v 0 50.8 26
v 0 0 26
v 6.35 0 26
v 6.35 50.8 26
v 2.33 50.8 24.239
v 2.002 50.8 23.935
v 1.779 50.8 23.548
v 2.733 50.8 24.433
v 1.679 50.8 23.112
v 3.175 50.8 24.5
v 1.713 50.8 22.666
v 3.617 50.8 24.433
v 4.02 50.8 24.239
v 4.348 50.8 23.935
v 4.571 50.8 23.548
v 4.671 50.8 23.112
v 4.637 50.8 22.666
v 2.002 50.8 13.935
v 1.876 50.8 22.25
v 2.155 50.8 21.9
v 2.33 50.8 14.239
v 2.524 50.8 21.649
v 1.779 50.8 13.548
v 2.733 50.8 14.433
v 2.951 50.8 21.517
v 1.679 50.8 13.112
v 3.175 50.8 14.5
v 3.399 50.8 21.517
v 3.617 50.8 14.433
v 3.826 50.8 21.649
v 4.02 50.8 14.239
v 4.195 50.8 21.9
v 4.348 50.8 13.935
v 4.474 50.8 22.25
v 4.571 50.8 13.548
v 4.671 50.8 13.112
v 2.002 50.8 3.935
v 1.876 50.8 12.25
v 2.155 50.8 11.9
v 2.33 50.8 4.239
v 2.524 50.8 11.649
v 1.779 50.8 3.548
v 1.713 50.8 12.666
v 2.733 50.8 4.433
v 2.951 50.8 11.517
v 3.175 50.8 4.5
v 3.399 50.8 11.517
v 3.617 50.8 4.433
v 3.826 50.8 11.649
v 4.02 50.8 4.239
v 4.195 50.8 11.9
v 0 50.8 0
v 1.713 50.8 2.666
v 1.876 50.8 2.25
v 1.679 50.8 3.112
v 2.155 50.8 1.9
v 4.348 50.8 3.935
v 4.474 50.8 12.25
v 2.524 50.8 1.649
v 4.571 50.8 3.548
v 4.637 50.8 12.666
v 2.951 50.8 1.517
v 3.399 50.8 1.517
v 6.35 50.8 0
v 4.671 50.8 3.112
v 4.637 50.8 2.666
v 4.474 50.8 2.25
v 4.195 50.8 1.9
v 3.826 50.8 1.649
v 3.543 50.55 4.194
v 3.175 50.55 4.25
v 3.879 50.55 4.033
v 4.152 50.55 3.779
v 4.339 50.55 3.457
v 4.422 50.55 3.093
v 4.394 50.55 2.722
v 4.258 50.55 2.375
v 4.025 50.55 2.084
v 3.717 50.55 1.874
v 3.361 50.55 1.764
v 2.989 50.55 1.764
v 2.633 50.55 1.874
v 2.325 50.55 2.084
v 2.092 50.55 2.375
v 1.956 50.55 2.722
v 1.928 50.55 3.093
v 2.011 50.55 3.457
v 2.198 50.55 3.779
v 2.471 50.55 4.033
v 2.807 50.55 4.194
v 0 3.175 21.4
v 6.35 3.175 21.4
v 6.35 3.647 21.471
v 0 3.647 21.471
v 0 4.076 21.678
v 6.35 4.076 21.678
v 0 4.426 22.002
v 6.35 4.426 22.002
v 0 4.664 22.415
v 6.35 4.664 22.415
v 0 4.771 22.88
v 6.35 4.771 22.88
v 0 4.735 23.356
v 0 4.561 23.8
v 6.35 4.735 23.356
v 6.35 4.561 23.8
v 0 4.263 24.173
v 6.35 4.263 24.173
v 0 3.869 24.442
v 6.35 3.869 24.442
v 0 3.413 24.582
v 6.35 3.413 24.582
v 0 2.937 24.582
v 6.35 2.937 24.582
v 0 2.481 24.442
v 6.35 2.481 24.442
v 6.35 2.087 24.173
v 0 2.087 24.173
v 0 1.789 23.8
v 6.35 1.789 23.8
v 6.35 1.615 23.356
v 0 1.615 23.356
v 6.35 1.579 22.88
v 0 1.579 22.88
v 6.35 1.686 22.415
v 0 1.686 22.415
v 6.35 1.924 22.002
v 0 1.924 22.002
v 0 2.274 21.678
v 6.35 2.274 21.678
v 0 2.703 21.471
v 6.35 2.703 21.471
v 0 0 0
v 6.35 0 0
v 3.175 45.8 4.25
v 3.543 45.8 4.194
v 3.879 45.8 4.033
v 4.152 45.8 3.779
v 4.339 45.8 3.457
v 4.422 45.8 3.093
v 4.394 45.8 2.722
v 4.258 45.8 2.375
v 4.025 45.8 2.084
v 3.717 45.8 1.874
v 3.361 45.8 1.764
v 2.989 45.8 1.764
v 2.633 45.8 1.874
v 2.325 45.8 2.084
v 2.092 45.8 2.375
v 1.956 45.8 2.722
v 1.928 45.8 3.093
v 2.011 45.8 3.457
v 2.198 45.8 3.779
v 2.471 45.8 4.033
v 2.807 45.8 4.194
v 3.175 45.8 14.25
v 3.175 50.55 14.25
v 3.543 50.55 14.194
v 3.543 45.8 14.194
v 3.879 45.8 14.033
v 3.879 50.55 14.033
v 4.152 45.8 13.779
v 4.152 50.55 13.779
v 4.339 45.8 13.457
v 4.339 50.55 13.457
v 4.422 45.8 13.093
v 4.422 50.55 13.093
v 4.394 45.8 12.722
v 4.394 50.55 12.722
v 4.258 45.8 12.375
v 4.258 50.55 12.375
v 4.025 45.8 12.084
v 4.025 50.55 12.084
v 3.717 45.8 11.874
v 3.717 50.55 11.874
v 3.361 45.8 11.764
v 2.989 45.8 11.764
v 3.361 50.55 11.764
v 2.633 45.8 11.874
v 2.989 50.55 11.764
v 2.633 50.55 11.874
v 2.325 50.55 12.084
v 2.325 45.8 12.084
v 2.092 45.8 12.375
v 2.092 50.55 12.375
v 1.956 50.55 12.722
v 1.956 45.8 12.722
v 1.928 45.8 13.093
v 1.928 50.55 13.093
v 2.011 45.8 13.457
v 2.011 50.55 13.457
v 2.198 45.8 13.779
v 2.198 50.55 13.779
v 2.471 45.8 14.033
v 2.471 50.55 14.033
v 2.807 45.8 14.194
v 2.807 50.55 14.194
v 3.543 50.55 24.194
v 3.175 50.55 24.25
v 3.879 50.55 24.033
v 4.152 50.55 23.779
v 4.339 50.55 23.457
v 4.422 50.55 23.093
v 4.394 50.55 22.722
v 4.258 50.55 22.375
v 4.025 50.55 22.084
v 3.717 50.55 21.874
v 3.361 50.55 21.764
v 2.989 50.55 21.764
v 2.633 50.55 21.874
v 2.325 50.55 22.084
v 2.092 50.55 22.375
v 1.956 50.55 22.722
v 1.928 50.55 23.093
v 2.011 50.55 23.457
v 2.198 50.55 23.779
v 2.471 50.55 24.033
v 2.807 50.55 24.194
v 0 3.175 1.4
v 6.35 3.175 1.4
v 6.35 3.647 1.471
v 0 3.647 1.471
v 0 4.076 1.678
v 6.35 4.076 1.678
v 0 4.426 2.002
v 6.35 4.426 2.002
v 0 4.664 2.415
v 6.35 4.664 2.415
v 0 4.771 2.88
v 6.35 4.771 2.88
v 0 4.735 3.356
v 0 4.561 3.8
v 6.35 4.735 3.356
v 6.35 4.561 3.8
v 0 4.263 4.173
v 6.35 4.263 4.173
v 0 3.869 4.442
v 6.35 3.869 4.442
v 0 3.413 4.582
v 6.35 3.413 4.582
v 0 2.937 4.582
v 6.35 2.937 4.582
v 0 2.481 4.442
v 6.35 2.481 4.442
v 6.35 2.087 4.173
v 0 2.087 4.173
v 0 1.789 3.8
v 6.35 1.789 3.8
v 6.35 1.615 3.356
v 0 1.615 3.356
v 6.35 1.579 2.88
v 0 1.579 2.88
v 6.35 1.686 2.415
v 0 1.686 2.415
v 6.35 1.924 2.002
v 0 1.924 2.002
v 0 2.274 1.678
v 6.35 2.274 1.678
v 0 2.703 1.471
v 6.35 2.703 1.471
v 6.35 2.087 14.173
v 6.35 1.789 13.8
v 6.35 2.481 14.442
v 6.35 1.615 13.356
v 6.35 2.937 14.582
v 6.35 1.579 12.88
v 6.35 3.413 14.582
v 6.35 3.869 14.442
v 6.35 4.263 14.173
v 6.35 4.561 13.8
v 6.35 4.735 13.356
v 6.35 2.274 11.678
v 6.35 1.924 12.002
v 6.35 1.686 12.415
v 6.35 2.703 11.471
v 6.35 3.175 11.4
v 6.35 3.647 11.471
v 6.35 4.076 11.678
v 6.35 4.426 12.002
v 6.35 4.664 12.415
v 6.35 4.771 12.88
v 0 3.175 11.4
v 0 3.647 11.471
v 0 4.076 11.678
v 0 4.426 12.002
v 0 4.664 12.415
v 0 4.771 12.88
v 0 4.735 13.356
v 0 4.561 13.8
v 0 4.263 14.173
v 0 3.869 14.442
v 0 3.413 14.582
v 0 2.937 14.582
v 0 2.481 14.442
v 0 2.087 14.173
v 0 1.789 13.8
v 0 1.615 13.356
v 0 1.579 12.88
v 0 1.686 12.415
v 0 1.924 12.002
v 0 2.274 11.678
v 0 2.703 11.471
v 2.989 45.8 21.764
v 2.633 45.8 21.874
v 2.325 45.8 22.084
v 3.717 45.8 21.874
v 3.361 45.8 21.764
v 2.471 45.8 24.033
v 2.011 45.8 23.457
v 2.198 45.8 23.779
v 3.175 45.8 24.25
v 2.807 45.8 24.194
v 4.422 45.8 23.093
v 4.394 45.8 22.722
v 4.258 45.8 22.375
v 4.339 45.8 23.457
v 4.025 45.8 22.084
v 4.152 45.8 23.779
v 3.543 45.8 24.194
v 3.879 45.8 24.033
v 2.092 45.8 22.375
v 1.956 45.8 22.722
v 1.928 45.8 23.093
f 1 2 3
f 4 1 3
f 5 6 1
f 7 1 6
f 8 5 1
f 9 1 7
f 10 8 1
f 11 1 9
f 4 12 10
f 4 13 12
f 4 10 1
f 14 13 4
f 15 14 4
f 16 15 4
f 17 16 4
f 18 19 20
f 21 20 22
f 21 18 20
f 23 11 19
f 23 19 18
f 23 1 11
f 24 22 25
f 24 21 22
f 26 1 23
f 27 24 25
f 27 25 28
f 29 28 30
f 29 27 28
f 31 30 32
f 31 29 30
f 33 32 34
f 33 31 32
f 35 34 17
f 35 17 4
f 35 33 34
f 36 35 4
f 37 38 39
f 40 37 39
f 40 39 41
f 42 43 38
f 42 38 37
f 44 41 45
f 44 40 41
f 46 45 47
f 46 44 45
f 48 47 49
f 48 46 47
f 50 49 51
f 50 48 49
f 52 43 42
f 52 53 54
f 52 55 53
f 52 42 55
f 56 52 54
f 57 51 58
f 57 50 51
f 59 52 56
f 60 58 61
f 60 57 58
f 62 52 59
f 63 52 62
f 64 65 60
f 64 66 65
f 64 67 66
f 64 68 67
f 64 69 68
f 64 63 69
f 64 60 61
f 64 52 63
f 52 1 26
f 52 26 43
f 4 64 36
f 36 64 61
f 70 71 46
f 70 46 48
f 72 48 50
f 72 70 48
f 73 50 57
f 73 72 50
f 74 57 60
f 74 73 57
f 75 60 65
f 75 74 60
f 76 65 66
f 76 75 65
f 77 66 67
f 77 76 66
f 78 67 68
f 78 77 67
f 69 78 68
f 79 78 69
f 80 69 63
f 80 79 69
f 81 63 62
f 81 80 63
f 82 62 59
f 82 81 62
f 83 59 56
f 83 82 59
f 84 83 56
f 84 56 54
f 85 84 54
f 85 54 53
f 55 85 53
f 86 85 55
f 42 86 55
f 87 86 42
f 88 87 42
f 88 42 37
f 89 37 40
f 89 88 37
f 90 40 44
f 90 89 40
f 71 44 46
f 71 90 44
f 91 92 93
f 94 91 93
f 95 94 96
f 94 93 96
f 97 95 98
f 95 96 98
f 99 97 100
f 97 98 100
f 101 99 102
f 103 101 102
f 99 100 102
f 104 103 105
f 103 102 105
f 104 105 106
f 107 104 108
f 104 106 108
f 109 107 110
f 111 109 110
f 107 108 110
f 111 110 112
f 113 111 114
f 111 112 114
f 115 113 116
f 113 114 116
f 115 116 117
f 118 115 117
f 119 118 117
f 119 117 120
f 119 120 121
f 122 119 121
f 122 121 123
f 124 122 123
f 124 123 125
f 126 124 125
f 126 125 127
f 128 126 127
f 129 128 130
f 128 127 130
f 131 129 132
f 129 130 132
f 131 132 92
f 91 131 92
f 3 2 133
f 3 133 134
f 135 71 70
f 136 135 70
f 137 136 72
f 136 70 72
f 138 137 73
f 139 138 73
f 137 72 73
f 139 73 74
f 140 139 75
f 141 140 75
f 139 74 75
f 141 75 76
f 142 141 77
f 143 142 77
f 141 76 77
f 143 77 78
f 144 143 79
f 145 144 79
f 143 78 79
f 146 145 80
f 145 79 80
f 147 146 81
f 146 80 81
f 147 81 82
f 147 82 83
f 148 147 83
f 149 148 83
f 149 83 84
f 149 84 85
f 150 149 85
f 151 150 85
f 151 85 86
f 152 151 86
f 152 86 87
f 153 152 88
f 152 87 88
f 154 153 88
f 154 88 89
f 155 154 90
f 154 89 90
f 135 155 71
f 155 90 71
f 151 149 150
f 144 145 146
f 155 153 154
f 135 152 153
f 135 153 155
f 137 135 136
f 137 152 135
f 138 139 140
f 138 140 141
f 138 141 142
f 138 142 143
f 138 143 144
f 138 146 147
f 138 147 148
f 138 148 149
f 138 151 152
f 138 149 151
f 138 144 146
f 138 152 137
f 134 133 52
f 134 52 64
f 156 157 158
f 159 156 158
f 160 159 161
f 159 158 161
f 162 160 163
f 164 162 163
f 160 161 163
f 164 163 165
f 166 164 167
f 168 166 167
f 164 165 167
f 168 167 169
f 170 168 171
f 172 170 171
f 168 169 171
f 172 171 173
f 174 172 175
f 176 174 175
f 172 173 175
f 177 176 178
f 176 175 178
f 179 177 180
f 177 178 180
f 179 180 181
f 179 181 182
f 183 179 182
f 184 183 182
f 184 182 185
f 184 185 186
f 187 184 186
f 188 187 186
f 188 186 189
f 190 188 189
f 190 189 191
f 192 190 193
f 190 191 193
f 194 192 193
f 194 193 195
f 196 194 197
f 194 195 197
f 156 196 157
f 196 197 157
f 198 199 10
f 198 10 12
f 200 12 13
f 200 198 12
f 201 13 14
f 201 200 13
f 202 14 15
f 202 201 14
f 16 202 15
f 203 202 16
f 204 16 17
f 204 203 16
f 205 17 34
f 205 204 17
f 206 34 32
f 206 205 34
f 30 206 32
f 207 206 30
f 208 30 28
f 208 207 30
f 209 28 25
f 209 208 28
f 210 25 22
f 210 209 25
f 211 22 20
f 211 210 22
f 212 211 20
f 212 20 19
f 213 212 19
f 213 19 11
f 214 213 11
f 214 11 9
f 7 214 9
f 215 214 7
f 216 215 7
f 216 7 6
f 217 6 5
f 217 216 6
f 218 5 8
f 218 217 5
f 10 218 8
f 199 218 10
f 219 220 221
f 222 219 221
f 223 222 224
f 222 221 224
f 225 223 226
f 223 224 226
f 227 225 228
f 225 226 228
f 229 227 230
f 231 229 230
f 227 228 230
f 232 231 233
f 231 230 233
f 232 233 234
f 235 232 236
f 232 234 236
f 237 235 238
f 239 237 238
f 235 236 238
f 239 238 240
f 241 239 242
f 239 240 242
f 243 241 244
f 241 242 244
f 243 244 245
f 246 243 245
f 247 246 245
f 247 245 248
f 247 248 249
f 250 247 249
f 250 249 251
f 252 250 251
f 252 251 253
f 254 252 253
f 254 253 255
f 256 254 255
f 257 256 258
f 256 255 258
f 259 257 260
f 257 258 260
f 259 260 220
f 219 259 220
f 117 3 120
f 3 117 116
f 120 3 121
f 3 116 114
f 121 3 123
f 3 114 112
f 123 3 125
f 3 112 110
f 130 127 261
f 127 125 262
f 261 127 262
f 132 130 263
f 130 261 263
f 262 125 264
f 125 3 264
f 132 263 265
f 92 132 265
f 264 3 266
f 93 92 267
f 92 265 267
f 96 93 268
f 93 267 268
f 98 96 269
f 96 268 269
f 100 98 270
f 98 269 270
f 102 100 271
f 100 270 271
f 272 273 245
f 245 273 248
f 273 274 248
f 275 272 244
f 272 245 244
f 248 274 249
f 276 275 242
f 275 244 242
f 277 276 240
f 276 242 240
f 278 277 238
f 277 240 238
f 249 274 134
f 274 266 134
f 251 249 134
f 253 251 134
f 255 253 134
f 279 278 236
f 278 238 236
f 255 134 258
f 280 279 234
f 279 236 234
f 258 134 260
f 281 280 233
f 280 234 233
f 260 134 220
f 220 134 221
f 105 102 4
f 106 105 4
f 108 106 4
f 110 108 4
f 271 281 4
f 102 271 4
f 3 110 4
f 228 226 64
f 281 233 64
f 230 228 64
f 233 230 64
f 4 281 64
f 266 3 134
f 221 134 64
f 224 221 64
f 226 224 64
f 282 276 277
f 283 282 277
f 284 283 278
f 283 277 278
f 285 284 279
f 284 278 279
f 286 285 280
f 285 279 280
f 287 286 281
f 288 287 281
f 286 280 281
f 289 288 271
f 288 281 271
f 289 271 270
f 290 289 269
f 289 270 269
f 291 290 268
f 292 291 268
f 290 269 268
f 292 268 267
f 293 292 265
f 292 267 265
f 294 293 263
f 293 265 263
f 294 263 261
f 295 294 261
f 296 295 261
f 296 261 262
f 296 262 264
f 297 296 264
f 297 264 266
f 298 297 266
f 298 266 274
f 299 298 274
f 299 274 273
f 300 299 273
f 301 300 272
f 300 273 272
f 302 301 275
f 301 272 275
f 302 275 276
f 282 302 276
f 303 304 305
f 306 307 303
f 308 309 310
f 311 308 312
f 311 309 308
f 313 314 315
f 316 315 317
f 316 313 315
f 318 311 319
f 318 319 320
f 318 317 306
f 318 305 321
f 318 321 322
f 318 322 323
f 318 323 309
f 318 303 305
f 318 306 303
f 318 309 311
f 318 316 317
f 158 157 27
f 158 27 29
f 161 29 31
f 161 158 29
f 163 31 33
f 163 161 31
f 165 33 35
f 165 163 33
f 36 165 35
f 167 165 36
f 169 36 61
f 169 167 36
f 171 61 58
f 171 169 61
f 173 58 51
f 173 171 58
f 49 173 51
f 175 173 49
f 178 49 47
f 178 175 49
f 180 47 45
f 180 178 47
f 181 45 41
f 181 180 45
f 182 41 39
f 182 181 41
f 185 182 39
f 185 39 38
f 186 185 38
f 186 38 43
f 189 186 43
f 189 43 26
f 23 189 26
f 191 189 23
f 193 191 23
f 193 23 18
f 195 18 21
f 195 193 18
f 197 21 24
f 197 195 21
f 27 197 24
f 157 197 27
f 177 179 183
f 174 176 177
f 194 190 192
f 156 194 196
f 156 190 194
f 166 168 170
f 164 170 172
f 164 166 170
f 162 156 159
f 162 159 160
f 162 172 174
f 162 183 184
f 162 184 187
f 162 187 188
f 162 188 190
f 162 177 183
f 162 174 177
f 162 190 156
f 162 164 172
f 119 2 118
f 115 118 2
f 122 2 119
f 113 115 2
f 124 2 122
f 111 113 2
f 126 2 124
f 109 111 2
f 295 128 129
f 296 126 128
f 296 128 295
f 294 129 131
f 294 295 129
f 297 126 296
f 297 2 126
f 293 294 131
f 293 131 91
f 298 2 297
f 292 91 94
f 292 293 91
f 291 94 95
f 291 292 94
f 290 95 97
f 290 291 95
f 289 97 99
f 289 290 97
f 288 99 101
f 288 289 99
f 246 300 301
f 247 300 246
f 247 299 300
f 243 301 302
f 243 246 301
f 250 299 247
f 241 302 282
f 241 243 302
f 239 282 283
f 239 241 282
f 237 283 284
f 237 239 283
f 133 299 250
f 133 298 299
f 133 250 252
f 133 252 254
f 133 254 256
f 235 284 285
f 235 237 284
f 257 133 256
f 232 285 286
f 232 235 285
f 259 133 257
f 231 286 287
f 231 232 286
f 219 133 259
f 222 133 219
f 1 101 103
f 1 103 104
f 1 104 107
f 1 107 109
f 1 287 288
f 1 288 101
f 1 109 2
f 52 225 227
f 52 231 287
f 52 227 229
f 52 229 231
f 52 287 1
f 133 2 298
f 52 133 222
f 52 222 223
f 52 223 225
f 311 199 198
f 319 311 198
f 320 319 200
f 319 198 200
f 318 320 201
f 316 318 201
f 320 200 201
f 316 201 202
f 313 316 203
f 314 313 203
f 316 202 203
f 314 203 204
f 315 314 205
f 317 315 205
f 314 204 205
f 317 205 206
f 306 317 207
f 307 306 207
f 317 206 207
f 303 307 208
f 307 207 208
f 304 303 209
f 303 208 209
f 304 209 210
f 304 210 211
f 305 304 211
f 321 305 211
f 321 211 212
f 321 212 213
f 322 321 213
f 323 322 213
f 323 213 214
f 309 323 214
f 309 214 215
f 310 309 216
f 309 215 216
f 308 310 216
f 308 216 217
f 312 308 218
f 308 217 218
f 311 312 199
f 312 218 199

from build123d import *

# Parameters (mm, degrees)
SKETCH1_W           = 6.35
SKETCH1_H           = 50.8
BOSS_EXTRUDE1_DEPTH = 26
SKETCH4_R           = 1.6
CUT_EXTRUDE3_DEPTH  = 6.35
SKETCH14_R          = 1.25
CUT_EXTRUDE13_DEPTH = 5
CHAMFER3_SIZE       = 0.25


with BuildPart() as part:
    # Sketch1 → Boss-Extrude1 (new body)
    with BuildSketch(Plane.XY):
        with Locations((3.175, 25.4)):
            Rectangle(SKETCH1_W, SKETCH1_H)
    extrude(amount=BOSS_EXTRUDE1_DEPTH)

    # Sketch4 → Cut-Extrude3 (cut)
    with BuildSketch(Plane(origin=(6.35, 0, 0), x_dir=(0, 0, -1), z_dir=(1, 0, 0))):
        with Locations((-3, 3.175)):
            Circle(SKETCH4_R)
        with Locations((-23, 3.175)):
            Circle(SKETCH4_R)
        with Locations((-13, 3.175)):
            Circle(SKETCH4_R)
    extrude(amount=-CUT_EXTRUDE3_DEPTH, mode=Mode.SUBTRACT)

    # Sketch14 → Cut-Extrude13 (cut)
    with BuildSketch(Plane(origin=(0, 50.8, 0), x_dir=(1, 0, 0), z_dir=(0, 1, 0))):
        with Locations(Location((3.175, -23, 0), (0, 0, 270))):
            Circle(SKETCH14_R)
        with Locations(Location((3.175, -13, 0), (0, 0, 270))):
            Circle(SKETCH14_R)
        with Locations(Location((3.175, -3, 0), (0, 0, 270))):
            Circle(SKETCH14_R)
    extrude(amount=-CUT_EXTRUDE13_DEPTH, mode=Mode.SUBTRACT)

    # Chamfer3
    chamfer3_edges = [part.edges().sort_by_distance(p)[0] for p in [
        (3.175, 50.8, 21.75),
        (3.175, 50.8, 11.75),
        (3.175, 50.8, 1.75),
    ]]
    chamfer(chamfer3_edges, length=CHAMFER3_SIZE)


solid = part.part
